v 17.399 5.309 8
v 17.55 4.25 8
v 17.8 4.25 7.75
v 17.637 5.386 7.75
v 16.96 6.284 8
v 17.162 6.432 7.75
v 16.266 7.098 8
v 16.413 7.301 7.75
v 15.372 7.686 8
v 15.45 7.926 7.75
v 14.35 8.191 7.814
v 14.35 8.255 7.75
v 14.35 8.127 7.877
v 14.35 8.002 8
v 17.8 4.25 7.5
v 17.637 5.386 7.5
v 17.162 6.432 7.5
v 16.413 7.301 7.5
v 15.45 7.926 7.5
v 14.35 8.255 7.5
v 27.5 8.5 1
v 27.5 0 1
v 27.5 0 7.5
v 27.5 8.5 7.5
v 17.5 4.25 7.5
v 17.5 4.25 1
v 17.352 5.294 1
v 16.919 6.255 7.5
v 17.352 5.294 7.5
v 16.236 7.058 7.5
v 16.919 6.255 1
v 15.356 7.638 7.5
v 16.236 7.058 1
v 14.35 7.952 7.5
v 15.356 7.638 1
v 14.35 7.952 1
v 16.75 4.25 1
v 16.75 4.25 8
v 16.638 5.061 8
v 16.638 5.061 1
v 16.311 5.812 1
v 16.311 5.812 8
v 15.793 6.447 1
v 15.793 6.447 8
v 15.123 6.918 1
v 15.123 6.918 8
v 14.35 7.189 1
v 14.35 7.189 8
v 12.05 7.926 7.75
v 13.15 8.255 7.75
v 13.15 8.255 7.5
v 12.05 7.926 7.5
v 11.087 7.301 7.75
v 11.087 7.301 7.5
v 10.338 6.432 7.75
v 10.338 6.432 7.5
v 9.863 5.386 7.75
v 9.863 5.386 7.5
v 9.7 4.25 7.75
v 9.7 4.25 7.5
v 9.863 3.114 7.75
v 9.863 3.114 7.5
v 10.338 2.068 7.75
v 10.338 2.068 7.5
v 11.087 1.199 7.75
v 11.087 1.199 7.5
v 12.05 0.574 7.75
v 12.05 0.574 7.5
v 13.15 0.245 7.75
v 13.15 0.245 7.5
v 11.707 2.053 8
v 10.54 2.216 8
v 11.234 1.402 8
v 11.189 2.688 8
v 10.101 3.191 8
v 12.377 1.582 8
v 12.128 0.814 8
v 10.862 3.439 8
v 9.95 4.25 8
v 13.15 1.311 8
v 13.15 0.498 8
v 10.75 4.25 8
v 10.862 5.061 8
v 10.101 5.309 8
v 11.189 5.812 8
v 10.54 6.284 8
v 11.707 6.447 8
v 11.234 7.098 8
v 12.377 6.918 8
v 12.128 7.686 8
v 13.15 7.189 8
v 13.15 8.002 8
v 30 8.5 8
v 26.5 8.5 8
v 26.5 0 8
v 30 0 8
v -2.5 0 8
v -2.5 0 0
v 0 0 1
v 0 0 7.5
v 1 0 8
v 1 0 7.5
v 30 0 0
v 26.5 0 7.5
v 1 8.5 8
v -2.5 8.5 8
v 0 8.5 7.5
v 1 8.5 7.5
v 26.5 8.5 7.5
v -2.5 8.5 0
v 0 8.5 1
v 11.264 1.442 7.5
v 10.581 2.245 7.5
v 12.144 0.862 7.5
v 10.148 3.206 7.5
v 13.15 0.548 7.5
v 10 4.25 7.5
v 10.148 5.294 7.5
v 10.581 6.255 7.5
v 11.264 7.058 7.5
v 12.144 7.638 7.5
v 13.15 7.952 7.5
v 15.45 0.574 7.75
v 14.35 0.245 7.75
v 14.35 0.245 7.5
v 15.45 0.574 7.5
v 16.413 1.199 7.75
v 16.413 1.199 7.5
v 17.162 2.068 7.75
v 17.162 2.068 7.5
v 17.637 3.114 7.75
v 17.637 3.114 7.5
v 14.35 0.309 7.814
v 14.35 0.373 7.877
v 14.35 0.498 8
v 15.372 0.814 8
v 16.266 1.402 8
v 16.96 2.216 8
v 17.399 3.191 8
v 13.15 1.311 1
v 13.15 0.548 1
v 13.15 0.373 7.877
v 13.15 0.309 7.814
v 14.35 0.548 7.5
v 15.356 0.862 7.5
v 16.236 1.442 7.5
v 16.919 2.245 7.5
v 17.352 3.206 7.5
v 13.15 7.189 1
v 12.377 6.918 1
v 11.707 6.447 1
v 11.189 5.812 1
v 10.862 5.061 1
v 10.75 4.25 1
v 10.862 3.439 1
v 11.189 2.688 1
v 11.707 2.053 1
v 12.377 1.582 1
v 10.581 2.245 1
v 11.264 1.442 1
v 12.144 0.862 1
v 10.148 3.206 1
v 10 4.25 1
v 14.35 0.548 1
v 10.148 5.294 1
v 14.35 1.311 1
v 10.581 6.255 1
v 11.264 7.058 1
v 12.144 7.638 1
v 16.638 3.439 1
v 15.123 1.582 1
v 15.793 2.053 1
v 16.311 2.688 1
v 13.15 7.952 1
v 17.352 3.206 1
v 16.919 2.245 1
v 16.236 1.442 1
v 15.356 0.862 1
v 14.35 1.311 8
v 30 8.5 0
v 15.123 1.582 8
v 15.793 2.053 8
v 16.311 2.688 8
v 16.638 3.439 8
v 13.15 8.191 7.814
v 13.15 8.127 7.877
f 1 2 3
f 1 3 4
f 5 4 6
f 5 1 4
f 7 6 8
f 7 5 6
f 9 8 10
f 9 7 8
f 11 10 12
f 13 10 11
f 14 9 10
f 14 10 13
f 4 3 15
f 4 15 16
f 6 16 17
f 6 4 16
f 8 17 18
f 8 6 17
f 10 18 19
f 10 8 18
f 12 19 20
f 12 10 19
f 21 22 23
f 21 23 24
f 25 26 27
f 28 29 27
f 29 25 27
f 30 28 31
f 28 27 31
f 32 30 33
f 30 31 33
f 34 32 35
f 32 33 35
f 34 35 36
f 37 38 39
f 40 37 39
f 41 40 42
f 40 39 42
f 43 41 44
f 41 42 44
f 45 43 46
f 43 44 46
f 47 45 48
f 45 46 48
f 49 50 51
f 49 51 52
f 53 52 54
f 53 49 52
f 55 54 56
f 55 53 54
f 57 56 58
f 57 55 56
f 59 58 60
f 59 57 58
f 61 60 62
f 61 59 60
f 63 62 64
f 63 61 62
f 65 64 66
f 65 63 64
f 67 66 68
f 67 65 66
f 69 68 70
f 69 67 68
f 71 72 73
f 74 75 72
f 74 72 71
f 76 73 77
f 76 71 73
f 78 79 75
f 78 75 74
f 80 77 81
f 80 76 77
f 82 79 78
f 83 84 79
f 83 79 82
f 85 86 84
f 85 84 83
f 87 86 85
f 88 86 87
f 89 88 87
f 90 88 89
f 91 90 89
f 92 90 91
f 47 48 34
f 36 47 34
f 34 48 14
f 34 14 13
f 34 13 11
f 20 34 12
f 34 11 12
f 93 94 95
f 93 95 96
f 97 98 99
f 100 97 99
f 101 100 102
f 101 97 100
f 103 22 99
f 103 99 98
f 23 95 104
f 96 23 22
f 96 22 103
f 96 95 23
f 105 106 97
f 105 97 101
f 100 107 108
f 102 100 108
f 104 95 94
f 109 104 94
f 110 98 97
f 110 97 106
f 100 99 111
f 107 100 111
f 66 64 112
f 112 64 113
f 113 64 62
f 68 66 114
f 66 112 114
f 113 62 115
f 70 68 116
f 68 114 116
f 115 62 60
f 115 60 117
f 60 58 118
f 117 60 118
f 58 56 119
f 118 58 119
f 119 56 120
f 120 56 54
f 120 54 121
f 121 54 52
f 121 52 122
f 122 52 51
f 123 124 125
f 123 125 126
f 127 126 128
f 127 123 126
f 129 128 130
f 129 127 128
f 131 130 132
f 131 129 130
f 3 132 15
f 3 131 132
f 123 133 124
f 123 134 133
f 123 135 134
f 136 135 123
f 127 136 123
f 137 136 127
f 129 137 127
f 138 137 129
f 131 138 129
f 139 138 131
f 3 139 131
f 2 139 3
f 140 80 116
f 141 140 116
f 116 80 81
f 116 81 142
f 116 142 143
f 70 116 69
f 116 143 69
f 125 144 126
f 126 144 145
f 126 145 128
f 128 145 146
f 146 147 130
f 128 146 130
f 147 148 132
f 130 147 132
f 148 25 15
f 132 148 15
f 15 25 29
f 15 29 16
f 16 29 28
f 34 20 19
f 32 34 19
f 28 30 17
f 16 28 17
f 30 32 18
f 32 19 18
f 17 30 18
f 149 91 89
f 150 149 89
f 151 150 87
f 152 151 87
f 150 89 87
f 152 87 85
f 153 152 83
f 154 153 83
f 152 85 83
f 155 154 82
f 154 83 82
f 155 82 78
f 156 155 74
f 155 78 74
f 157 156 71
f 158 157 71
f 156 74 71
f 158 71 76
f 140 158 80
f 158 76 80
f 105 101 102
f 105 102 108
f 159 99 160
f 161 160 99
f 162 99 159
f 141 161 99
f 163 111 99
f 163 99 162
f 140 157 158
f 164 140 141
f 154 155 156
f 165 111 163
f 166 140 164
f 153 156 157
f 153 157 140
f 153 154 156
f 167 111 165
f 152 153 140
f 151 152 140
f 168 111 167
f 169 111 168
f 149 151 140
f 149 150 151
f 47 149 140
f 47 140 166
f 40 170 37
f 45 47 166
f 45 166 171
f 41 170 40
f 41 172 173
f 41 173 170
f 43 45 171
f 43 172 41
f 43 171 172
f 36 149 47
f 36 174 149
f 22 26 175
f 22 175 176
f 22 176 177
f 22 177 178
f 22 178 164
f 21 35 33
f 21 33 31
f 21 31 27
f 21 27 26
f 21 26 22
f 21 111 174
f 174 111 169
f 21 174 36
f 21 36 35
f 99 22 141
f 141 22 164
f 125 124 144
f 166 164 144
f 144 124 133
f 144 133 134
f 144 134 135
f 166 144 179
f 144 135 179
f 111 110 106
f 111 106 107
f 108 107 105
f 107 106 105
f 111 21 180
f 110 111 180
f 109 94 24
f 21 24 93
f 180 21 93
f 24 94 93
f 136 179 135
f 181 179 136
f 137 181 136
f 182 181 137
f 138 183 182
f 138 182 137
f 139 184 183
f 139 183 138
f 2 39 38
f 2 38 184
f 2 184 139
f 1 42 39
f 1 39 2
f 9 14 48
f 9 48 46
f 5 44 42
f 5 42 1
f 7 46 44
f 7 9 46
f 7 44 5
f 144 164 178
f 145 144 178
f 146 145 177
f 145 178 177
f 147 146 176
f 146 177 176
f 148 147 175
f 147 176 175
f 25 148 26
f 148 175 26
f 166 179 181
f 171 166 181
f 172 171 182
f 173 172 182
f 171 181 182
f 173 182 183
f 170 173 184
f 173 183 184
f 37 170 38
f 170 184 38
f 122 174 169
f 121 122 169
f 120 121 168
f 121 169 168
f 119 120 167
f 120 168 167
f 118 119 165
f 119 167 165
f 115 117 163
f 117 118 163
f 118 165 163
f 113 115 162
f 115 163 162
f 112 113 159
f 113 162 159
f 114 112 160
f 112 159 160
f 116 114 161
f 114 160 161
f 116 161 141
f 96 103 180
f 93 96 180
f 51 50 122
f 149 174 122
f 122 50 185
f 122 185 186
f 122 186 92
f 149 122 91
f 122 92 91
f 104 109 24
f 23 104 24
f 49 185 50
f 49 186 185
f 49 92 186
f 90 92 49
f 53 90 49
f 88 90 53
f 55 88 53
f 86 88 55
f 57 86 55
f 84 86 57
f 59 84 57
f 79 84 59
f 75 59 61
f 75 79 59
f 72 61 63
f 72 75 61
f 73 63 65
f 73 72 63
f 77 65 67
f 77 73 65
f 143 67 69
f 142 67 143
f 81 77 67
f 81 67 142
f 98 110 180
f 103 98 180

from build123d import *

# Parameters (mm, degrees)
F1_DEPTH = 1
F2_W     = 2.5
F2_H     = 8.5
F3_DEPTH = 8
F5_W     = 1
F5_H     = 8.5
F6_DEPTH = 0.5
F9_DEPTH = 9
F10_SIZE = 0.25


with BuildPart() as f1:
    # F0 (on Top) → F1 (new body)
    with BuildSketch(Plane.XY):
        with BuildLine():
            Line((0, 8.5), (0, 0))
            Line((0, 0), (13.75, 0))
            Line((13.75, 0), (13.75, 0.5))
            ThreePointArc((13.75, 0.5), (10, 4.25), (13.75, 8))
            Line((13.75, 8), (13.75, 8.5))
            Line((13.75, 8.5), (0, 8.5))
        make_face()
        with BuildLine():
            Line((13.75, 0.5), (13.75, 0))
            Line((13.75, 0), (27.5, 0))
            Line((27.5, 0), (27.5, 8.5))
            Line((27.5, 8.5), (13.75, 8.5))
            Line((13.75, 8.5), (13.75, 8))
            ThreePointArc((13.75, 8), (16.4016504294, 6.9016504294), (17.5, 4.25))
            ThreePointArc((17.5, 4.25), (16.4016504294, 1.5983495706), (13.75, 0.5))
        make_face()
        with BuildLine():
            ThreePointArc((13.75, 8), (10, 4.25), (13.75, 0.5))
            Line((13.75, 0.5), (13.75, 8))
        make_face()
        with BuildLine():
            Line((13.75, 8), (13.75, 0.5))
            ThreePointArc((13.75, 0.5), (16.4016504294, 1.5983495706), (17.5, 4.25))
            ThreePointArc((17.5, 4.25), (16.4016504294, 6.9016504294), (13.75, 8))
        make_face()
    extrude(amount=F1_DEPTH)

    # F2 (on Top) → F3 (join)
    with BuildSketch(Plane.XY):
        with Locations((-1.25, 4.25)):
            Rectangle(F2_W, F2_H)
        with BuildLine():
            ThreePointArc((13.75, 8), (10, 4.25), (13.75, 0.5))
            Line((13.75, 0.5), (13.75, 8))
        make_face()
        with BuildLine():
            Line((13.75, 8), (13.75, 0.5))
            ThreePointArc((13.75, 0.5), (16.4016504294, 1.5983495706), (17.5, 4.25))
            ThreePointArc((17.5, 4.25), (16.4016504294, 6.9016504294), (13.75, 8))
        make_face()
        with Locations((28.75, 4.25)):
            Rectangle(F2_W, F2_H)
    extrude(amount=F3_DEPTH)

    # F5 (on offset) → F6 (join)
    with BuildSketch(Plane.XY.offset(8)):
        with Locations((27, 4.25)):
            Rectangle(F5_W, F5_H)
        with Locations((0.5, 4.25)):
            Rectangle(F5_W, F5_H)
        with BuildLine():
            ThreePointArc((13.75, 8.3), (9.7, 4.25), (13.75, 0.2))
            Line((13.75, 0.2), (13.75, 8.3))
        make_face()
        with BuildLine():
            Line((13.75, 8.3), (13.75, 0.2))
            ThreePointArc((13.75, 0.2), (16.6137824638, 1.3862175362), (17.8, 4.25))
            ThreePointArc((17.8, 4.25), (16.6137824638, 7.1137824638), (13.75, 8.3))
        make_face()
    extrude(amount=-F6_DEPTH)

    # F8 (on offset) → F9 (cut)
    with BuildSketch(Plane.XY.offset(10)):
        with BuildLine():
            Line((13.75, 1.25), (13.75, 0))
            Line((13.75, 0), (14.35, 0))
            Line((14.35, 0), (14.35, 1.3106123087))
            ThreePointArc((14.35, 1.3106123087), (14.051526886, 1.265191541), (13.75, 1.25))
        make_face()
        with BuildLine():
            Line((13.75, 8.5), (13.75, 7.25))
            ThreePointArc((13.75, 7.25), (14.051526886, 7.234808459), (14.35, 7.1893876913))
            Line((14.35, 7.1893876913), (14.35, 8.5))
            Line((14.35, 8.5), (13.75, 8.5))
        make_face()
        with BuildLine():
            Line((13.75, 4.25), (13.75, 1.25))
            ThreePointArc((13.75, 1.25), (14.051526886, 1.265191541), (14.35, 1.3106123087))
            Line((14.35, 1.3106123087), (14.35, 4.25))
            Line((14.35, 4.25), (13.75, 4.25))
        make_face()
        with BuildLine():
            ThreePointArc((13.15, 7.1893876913), (10.75, 4.25), (13.15, 1.3106123087))
            Line((13.15, 1.3106123087), (13.15, 4.25))
            Line((13.15, 4.25), (13.15, 7.1893876913))
        make_face()
        with BuildLine():
            Line((13.15, 8.5), (13.15, 7.1893876913))
            ThreePointArc((13.15, 7.1893876913), (13.448473114, 7.234808459), (13.75, 7.25))
            Line((13.75, 7.25), (13.75, 8.5))
            Line((13.75, 8.5), (13.15, 8.5))
        make_face()
        with BuildLine():
            Line((13.75, 7.25), (13.75, 4.25))
            Line((13.75, 4.25), (14.35, 4.25))
            Line((14.35, 4.25), (14.35, 7.1893876913))
            ThreePointArc((14.35, 7.1893876913), (14.051526886, 7.234808459), (13.75, 7.25))
        make_face()
        with BuildLine():
            Line((13.15, 1.3106123087), (13.15, 0))
            Line((13.15, 0), (13.75, 0))
            Line((13.75, 0), (13.75, 1.25))
            ThreePointArc((13.75, 1.25), (13.448473114, 1.265191541), (13.15, 1.3106123087))
        make_face()
        with BuildLine():
            Line((14.35, 4.25), (14.35, 1.3106123087))
            ThreePointArc((14.35, 1.3106123087), (16.0737900077, 2.3526334039), (16.75, 4.25))
            ThreePointArc((16.75, 4.25), (16.0737900077, 6.1473665961), (14.35, 7.1893876913))
            Line((14.35, 7.1893876913), (14.35, 4.25))
        make_face()
        with BuildLine():
            Line((13.15, 4.25), (13.15, 1.3106123087))
            ThreePointArc((13.15, 1.3106123087), (13.448473114, 1.265191541), (13.75, 1.25))
            Line((13.75, 1.25), (13.75, 4.25))
            Line((13.75, 4.25), (13.75, 7.25))
            ThreePointArc((13.75, 7.25), (13.448473114, 7.234808459), (13.15, 7.1893876913))
            Line((13.15, 7.1893876913), (13.15, 4.25))
        make_face()
    extrude(amount=-F9_DEPTH, mode=Mode.SUBTRACT)

    # F10
    f10_edges = [f1.edges().sort_by_distance(p)[0] for p in [
        (9.7, 4.25, 8),
        (17.8, 4.25, 8),
    ]]
    chamfer(f10_edges, length=F10_SIZE)


solid = f1.part
